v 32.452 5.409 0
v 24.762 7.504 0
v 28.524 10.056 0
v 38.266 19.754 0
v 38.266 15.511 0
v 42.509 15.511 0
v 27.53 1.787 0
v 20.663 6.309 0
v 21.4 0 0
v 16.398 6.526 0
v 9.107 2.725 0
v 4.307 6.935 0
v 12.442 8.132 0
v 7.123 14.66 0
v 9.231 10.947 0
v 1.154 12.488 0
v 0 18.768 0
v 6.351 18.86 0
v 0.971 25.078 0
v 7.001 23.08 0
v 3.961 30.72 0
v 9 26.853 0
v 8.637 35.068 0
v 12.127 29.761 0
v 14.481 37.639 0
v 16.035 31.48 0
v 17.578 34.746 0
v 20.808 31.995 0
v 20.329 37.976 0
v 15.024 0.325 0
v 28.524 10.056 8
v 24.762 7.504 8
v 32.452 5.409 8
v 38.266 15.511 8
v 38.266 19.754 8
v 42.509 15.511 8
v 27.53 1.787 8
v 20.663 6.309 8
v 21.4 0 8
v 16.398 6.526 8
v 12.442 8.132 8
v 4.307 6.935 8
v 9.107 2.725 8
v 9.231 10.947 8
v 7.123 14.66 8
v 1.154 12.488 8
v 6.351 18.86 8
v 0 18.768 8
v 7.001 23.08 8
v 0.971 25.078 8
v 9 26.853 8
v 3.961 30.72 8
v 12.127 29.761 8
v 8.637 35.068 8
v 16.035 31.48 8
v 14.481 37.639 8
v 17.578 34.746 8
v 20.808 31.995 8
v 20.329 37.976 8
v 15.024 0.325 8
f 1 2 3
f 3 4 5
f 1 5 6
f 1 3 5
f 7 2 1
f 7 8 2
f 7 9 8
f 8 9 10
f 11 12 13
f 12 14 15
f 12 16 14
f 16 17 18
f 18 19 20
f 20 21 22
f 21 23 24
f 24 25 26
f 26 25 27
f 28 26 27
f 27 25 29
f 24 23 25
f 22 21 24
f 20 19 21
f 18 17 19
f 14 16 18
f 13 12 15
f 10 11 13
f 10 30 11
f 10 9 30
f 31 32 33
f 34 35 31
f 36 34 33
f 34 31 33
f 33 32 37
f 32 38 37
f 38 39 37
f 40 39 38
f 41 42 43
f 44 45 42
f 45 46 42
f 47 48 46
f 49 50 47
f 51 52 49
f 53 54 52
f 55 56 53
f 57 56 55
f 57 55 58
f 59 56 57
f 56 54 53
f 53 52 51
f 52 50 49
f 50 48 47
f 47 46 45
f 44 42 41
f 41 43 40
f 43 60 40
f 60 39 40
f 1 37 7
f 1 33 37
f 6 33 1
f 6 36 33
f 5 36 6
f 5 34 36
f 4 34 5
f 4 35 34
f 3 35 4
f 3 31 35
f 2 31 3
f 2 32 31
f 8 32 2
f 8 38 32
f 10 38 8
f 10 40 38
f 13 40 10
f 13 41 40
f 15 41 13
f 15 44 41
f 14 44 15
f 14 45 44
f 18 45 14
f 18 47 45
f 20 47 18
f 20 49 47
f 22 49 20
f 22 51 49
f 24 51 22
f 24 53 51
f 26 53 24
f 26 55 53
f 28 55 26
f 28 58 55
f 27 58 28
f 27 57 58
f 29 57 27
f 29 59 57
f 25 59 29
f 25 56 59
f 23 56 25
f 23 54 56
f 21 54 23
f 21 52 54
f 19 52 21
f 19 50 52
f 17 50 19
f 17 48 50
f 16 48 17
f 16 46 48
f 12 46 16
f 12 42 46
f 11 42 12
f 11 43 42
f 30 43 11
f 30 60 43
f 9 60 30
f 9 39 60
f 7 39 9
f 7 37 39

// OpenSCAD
$fn = 32;

// ----------------------------------------------------------------------
// Eye lug: ring_tail, 8 mm thick
// ----------------------------------------------------------------------

// --- parameters (mm) ---
profile_height = 8;       // extrusion height
profile_points = 30;      // points of the closed outline

profile = [[17.578, 34.746], [20.329, 37.976], [14.481, 37.639], [8.637, 35.068], [3.961, 30.72], [0.971, 25.078], [0, 18.768], [1.154, 12.488], [4.307, 6.935], [9.107, 2.725], [15.024, 0.325], [21.4, 0], [27.53, 1.787], [32.452, 5.409], [42.509, 15.511], [38.266, 15.511], [38.266, 19.754], [28.524, 10.056], [24.762, 7.504], [20.663, 6.309], [16.398, 6.526], [12.442, 8.132], [9.231, 10.947], [7.123, 14.66], [6.351, 18.86], [7.001, 23.08], [9, 26.853], [12.127, 29.761], [16.035, 31.48], [20.808, 31.995]];  // single closed polygon, 30 points, counter clockwise

// --- the one profile operation ---
linear_extrude(height = profile_height) polygon(points = profile);
